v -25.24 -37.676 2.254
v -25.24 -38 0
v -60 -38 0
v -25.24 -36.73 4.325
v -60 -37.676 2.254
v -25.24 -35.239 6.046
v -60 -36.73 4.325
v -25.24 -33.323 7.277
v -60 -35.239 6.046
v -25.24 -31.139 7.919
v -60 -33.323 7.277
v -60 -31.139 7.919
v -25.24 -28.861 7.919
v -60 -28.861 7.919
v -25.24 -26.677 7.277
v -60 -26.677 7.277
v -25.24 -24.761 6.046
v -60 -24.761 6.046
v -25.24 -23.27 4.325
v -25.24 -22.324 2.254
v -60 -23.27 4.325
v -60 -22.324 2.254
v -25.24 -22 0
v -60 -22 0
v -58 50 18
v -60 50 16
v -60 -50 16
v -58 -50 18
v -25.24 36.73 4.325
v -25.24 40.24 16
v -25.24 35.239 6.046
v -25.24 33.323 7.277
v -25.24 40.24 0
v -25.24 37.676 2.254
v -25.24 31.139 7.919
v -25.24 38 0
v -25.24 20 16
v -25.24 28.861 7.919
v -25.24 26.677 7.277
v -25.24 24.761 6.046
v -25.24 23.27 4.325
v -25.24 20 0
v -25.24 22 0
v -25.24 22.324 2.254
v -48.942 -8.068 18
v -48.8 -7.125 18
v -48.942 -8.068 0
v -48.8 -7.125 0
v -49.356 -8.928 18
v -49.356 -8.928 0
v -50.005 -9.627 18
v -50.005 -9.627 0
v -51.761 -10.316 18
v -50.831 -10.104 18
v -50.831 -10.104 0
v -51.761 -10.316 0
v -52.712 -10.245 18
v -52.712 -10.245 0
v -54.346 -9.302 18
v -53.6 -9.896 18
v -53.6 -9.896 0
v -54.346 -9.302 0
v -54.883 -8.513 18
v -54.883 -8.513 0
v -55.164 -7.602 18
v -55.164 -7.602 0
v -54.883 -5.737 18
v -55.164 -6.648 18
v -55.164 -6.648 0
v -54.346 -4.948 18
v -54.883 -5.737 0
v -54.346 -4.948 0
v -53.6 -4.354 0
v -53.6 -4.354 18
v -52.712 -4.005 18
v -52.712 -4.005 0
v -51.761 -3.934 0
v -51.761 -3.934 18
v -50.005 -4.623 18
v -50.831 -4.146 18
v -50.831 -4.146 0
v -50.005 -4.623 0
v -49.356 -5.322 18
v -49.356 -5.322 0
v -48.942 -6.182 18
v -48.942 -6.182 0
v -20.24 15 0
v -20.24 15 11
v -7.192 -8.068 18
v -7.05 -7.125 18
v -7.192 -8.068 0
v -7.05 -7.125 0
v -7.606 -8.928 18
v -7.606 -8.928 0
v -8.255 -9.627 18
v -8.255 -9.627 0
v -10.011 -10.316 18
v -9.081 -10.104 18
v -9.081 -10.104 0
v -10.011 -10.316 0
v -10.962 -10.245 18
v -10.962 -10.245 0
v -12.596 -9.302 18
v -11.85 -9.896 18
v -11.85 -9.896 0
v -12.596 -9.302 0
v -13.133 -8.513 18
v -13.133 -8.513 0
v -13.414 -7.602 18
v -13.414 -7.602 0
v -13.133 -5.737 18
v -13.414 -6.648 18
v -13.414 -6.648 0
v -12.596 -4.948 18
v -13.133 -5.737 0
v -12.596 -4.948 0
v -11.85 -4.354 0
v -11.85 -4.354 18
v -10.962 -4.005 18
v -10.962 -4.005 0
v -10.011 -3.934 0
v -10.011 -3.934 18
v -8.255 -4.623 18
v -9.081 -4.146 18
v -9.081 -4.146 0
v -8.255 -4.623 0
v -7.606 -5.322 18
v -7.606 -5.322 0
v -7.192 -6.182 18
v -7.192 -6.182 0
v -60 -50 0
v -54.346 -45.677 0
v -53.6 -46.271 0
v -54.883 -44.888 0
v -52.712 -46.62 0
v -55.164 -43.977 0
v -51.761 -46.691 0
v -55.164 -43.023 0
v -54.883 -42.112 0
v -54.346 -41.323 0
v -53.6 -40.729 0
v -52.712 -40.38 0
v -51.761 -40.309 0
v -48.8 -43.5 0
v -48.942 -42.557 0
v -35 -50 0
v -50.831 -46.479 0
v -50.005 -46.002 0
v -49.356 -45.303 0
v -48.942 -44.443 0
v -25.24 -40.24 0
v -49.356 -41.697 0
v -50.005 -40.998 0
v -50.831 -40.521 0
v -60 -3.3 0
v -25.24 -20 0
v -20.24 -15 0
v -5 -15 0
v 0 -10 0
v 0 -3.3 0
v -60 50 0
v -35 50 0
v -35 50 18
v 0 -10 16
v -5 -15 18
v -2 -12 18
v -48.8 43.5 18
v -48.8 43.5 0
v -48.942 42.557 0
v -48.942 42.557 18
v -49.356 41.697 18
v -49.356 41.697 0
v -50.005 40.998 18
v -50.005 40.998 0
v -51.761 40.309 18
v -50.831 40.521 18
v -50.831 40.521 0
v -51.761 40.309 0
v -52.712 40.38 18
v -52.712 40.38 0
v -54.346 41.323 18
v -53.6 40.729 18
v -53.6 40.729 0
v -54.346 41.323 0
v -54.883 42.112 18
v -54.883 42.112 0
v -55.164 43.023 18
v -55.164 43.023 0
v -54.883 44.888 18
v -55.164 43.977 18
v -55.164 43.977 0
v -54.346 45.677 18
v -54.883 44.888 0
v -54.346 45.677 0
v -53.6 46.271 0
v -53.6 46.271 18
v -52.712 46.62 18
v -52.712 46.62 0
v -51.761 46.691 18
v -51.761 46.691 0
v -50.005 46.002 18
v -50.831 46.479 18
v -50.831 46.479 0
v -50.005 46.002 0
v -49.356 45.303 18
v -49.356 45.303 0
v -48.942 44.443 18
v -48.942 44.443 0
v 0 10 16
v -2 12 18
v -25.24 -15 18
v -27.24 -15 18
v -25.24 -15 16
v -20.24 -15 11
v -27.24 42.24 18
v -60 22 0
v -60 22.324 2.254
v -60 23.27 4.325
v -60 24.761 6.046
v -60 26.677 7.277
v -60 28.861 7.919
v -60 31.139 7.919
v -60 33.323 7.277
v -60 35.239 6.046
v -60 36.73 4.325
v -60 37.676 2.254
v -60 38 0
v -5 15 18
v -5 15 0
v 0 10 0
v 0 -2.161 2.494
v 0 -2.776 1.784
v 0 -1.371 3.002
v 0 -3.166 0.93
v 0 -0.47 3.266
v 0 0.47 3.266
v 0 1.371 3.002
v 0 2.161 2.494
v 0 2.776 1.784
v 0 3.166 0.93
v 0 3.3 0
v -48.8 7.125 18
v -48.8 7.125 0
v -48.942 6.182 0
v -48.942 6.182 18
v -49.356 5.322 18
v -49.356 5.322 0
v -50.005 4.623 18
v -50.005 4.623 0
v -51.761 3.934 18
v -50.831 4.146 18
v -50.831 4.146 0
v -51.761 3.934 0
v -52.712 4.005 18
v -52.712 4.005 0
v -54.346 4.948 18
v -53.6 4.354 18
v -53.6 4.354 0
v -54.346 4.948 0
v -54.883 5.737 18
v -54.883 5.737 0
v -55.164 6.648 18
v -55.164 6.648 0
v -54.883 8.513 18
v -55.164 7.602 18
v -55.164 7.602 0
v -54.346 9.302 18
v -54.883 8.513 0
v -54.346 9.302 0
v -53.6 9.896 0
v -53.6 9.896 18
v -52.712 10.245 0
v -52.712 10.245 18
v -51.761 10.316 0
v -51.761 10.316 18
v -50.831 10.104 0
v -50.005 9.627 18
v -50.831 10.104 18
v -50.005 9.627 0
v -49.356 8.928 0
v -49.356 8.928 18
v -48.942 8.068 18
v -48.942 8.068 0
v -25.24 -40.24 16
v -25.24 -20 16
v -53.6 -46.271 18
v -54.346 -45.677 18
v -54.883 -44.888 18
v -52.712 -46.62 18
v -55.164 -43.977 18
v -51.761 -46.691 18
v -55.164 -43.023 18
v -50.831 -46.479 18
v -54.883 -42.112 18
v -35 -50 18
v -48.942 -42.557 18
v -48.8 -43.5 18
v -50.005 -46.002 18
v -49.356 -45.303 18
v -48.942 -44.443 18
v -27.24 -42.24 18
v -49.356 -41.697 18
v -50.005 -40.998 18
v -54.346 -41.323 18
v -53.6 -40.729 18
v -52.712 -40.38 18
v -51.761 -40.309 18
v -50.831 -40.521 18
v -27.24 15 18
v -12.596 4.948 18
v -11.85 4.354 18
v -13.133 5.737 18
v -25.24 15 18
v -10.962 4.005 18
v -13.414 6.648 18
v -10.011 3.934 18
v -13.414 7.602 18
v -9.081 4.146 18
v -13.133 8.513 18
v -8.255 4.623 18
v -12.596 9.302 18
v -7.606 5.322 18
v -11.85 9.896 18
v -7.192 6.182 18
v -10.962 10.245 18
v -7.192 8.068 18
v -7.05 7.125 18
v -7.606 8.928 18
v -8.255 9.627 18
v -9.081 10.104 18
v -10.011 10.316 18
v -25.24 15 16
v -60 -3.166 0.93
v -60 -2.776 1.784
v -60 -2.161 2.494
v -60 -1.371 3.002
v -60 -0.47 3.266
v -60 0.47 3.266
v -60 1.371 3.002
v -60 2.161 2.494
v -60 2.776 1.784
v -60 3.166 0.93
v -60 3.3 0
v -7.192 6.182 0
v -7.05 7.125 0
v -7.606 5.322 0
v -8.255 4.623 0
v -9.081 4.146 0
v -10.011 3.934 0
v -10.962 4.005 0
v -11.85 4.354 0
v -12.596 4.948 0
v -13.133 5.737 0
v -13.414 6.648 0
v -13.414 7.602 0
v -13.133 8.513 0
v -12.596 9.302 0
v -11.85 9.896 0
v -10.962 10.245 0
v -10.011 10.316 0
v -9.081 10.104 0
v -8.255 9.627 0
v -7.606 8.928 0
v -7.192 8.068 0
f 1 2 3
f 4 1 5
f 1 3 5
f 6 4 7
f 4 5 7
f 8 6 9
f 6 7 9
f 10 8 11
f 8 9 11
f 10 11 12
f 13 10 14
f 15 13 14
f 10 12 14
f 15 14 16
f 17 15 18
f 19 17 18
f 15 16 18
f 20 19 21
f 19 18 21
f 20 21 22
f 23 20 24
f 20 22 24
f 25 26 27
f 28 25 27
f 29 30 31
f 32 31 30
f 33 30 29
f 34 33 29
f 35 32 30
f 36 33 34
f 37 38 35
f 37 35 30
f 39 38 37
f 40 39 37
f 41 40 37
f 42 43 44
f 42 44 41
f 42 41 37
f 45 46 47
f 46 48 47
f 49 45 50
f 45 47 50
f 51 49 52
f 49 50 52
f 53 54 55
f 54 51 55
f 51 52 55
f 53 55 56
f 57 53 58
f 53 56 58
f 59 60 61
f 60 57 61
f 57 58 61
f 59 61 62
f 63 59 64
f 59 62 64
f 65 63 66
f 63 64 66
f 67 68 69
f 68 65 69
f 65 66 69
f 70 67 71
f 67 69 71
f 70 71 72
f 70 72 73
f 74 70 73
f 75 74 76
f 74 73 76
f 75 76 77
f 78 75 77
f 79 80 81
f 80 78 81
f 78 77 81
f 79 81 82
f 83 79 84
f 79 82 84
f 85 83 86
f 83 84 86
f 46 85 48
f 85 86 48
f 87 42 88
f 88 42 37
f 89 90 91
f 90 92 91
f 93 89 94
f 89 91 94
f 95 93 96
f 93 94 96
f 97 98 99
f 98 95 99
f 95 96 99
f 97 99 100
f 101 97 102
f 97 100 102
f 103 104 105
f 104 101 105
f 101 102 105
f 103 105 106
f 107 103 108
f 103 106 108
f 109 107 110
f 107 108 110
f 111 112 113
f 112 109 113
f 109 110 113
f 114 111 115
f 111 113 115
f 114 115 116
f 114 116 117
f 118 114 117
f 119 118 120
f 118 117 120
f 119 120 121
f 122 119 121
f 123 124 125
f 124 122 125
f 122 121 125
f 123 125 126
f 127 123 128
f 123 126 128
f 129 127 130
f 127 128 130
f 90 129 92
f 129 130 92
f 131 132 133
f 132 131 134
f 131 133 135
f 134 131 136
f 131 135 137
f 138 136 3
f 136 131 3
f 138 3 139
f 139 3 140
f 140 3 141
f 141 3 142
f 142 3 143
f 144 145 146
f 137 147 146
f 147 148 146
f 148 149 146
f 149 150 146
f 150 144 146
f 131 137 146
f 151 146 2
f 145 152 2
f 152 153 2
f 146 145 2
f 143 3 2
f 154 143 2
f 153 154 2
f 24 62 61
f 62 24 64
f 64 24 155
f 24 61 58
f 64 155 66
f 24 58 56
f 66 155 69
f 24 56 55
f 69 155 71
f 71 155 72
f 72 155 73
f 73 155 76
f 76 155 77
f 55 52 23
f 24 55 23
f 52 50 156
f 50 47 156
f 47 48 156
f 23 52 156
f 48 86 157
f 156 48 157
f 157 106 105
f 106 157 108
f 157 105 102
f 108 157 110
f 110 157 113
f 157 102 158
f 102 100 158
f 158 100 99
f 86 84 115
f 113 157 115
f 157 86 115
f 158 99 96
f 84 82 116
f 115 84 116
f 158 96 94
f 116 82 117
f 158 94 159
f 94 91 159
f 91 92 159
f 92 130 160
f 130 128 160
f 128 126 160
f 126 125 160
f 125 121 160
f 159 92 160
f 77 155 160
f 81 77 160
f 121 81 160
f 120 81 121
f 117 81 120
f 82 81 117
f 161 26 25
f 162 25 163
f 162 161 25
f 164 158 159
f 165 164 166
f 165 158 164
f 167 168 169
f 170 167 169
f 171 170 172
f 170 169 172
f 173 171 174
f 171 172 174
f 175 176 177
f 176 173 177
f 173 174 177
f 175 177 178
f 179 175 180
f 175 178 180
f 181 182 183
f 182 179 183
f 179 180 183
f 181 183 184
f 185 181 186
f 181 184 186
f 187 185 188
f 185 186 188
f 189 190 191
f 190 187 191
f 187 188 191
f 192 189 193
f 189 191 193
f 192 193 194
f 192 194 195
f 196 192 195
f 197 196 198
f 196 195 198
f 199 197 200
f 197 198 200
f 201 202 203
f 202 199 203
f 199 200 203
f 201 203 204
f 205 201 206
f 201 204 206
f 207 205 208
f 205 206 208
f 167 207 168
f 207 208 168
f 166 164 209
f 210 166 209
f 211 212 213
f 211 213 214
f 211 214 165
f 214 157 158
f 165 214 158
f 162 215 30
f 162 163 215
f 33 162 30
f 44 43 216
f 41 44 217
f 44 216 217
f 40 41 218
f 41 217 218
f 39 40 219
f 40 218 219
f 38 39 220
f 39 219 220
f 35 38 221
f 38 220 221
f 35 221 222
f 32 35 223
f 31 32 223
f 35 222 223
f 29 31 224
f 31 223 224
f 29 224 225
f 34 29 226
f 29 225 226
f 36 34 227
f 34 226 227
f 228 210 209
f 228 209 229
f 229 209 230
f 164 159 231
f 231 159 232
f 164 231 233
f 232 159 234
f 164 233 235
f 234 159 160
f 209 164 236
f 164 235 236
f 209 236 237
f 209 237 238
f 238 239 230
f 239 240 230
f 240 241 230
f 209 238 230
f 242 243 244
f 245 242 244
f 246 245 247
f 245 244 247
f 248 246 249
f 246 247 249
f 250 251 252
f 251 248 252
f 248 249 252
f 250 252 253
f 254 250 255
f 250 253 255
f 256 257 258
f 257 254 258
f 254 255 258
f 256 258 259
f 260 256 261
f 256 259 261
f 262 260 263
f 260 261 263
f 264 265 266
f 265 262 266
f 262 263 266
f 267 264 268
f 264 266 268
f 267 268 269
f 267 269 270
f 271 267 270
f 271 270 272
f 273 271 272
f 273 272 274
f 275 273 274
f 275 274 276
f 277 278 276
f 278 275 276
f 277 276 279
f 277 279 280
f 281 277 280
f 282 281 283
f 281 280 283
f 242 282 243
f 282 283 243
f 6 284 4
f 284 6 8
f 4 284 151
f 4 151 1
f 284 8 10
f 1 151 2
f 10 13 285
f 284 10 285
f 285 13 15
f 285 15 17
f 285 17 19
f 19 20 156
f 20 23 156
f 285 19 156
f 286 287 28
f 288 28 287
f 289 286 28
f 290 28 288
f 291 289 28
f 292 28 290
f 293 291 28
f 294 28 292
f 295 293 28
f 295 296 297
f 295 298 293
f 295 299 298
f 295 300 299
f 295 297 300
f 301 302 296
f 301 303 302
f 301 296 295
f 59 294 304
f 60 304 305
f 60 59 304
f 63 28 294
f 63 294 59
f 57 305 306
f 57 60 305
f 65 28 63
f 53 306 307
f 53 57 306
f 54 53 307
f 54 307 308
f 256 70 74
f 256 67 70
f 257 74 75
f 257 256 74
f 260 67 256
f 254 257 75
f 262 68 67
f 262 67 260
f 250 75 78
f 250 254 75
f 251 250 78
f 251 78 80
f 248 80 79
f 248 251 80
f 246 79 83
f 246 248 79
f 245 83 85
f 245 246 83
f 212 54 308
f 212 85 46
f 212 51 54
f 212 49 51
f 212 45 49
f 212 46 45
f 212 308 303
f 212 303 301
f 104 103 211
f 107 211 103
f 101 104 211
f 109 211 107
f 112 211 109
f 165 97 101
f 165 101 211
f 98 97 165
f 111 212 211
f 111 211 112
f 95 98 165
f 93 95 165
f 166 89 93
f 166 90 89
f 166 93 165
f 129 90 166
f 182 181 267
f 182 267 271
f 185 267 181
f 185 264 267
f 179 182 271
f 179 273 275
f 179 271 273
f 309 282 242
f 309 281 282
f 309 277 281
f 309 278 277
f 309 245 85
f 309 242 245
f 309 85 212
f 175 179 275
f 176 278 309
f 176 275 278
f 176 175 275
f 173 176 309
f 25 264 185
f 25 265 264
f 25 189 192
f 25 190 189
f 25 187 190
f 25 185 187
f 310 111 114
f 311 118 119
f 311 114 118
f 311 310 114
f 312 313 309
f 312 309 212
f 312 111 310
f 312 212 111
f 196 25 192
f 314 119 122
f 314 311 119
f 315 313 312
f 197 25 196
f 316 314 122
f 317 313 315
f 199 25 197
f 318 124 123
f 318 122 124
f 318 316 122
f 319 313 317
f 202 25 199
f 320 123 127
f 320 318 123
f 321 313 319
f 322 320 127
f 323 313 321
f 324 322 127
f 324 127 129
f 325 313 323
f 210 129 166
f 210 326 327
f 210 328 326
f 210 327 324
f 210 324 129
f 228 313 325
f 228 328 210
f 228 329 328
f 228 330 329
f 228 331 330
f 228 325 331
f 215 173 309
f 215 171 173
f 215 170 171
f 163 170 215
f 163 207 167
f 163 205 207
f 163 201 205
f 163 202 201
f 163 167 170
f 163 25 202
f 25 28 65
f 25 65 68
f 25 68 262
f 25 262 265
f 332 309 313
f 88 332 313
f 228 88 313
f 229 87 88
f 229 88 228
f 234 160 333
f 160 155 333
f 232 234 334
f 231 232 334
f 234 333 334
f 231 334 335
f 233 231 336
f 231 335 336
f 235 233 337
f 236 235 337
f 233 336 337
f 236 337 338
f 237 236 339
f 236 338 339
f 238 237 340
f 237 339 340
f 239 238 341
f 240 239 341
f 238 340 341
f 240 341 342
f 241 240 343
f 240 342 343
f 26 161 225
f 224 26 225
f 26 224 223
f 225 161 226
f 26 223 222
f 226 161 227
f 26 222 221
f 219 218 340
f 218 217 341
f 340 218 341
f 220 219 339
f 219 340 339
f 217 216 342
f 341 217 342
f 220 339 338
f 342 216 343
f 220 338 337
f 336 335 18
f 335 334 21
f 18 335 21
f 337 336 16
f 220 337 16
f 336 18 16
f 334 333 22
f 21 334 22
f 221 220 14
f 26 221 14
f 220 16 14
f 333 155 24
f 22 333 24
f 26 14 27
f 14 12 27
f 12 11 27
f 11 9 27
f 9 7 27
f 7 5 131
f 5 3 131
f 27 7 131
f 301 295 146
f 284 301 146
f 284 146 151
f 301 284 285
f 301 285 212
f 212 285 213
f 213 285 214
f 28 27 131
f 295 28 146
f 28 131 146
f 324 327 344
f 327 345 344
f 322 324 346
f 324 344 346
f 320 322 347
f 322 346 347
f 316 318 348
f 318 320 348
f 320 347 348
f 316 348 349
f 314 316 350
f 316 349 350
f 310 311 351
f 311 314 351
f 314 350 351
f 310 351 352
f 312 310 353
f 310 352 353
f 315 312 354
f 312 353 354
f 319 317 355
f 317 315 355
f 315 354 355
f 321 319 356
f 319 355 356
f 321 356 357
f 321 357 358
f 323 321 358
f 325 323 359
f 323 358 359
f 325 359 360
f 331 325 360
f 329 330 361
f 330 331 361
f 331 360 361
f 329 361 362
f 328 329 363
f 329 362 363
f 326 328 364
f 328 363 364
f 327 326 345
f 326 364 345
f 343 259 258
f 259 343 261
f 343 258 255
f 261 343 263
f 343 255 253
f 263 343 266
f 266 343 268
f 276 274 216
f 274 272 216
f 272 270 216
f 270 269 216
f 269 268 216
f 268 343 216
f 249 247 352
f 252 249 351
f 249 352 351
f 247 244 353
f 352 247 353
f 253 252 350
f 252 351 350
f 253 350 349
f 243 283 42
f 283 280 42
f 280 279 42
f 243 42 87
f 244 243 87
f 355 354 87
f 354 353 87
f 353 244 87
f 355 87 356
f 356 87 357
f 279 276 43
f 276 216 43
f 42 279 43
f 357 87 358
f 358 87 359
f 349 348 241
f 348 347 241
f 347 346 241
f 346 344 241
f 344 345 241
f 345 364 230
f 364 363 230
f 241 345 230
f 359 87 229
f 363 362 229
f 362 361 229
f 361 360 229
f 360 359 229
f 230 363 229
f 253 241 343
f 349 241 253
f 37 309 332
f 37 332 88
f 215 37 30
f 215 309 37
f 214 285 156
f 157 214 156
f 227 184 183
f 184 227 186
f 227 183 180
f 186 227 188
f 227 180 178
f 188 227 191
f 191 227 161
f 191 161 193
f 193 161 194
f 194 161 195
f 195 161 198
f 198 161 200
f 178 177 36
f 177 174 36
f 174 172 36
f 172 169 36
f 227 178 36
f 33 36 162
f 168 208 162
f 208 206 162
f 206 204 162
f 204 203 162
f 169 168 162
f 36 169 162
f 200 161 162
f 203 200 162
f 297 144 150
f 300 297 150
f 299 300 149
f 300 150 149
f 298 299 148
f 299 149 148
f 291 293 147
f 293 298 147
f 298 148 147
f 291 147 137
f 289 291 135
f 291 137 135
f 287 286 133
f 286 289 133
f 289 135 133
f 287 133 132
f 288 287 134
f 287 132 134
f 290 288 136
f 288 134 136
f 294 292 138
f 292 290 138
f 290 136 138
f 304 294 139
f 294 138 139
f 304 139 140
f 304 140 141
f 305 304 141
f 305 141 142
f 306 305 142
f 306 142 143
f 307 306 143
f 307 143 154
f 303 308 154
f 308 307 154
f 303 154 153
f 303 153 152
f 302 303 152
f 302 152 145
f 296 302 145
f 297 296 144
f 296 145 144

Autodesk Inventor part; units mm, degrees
ref_plane "YZ Plane" through (0, 0, 0) normal (1, 0, 0) x (0, 1, 0)
ref_plane "XZ Plane" through (0, 0, 0) normal (0, 1, 0) x (-1, 0, 0)
ref_plane "XY Plane" through (0, 0, 0) normal (0, 0, 1) x (1, 0, 0)
sketch "Sketch1" plane through (0, 0, 0) normal (0, 0, 1) x (1, 0, 0)
  line L0 (-58, -50) -> (-58, 50) construction
  line L1 (-58, -50) -> (58, -50) construction
  line L2 (58, 50) -> (58, -50) construction
  line L3 (58, 50) -> (-58, 50) construction
  line L4 (-48.8, -35) -> (-48.8, -43.5) construction
  arc A0 (-55.2, -43.5) -> (-48.8, -43.5) centre (-52, -43.5) ccw construction
  line L5 (-55.2, -43.5) -> (-55.2, -35) construction
  arc A1 (-48.8, -35) -> (-55.2, -35) centre (-52, -35) ccw construction
  line L6 (55.2, -35) -> (55.2, -43.5) construction
  arc A2 (48.8, -43.5) -> (55.2, -43.5) centre (52, -43.5) ccw construction
  line L7 (48.8, -43.5) -> (48.8, -35) construction
  arc A3 (55.2, -35) -> (48.8, -35) centre (52, -35) ccw construction
  circle A4 centre (10.25, -35) radius 3.2 construction
  circle A5 centre (-10.25, -35) radius 3.2 construction
  circle A6 centre (-10.25, 35) radius 3.2 construction
  circle A7 centre (10.25, 35) radius 3.2 construction
  line L8 (-55.2, 35) -> (-55.2, 43.5) construction
  arc A8 (-48.8, 43.5) -> (-55.2, 43.5) centre (-52, 43.5) ccw construction
  line L9 (-48.8, 43.5) -> (-48.8, 35) construction
  arc A9 (-55.2, 35) -> (-48.8, 35) centre (-52, 35) ccw construction
  circle A10 centre (-52, 7.125) radius 3.2 construction
  line L10 (-7.05, -7.125) -> (-7.05, -15.625) construction
  arc A11 (-13.45, -15.625) -> (-7.05, -15.625) centre (-10.25, -15.625) ccw construction
  line L11 (-13.45, -15.625) -> (-13.45, -7.125) construction
  arc A12 (-7.05, -7.125) -> (-13.45, -7.125) centre (-10.25, -7.125) ccw construction
  circle A13 centre (52, -7.125) radius 3.2 construction
  circle A14 centre (-52, -7.125) radius 3.2 construction
  line L12 (13.45, -7.125) -> (13.45, -15.625) construction
  arc A15 (7.05, -15.625) -> (13.45, -15.625) centre (10.25, -15.625) ccw construction
  line L13 (7.05, -15.625) -> (7.05, -7.125) construction
  arc A16 (13.45, -7.125) -> (7.05, -7.125) centre (10.25, -7.125) ccw construction
  circle A17 centre (52, 7.125) radius 3.2 construction
  line L14 (13.45, 15.625) -> (13.45, 7.125) construction
  arc A18 (7.05, 7.125) -> (13.45, 7.125) centre (10.25, 7.125) ccw construction
  line L15 (7.05, 7.125) -> (7.05, 15.625) construction
  arc A19 (13.45, 15.625) -> (7.05, 15.625) centre (10.25, 15.625) ccw construction
  line L16 (55.2, 43.5) -> (55.2, 35) construction
  arc A20 (48.8, 35) -> (55.2, 35) centre (52, 35) ccw construction
  line L17 (48.8, 35) -> (48.8, 43.5) construction
  arc A21 (55.2, 43.5) -> (48.8, 43.5) centre (52, 43.5) ccw construction
  line L18 (-7.05, 15.625) -> (-7.05, 7.125) construction
  arc A22 (-13.45, 7.125) -> (-7.05, 7.125) centre (-10.25, 7.125) ccw construction
  line L19 (-13.45, 7.125) -> (-13.45, 15.625) construction
  arc A23 (-7.05, 15.625) -> (-13.45, 15.625) centre (-10.25, 15.625) ccw construction
  line L20 (60, 50) -> (58, 50) construction
  line L21 (58, 50) -> (58, -50) construction
  line L22 (58, -50) -> (60, -50) construction
  line L23 (60, -50) -> (60, 50) construction
  line L24 (-60, -50) -> (-58, -50) construction
  line L25 (-58, -50) -> (-58, 50) construction
  line L26 (-58, 50) -> (-60, 50) construction
  line L27 (-60, 50) -> (-60, -50) construction
  circle A24 centre (-52, 43.5) radius 3.2
  circle A25 centre (-10.25, 15.625) radius 3.2
  circle A26 centre (52, 43.5) radius 3.2
  circle A27 centre (-52, -43.5) radius 3.2
  circle A28 centre (-52, 7.125) radius 3.2
  circle A29 centre (-52, -7.125) radius 3.2
  circle A30 centre (-10.25, -15.625) radius 3.2
  circle A31 centre (-10.25, -35) radius 3.2
  circle A32 centre (-10.25, 35) radius 3.2
  line L28 (-60, 50) -> (-60, -50)
  line L29 (-60, -50) -> (-35, -50)
  line L30 (0, -15) -> (0, 15)
  line L31 (-60, 50) -> (-35, 50)
  circle A33 centre (-10.25, 7.125) radius 3.2
  circle A34 centre (-10.25, -7.125) radius 3.2
  line L32 (-35, 50) -> (-25.2404, 40.2404)
  line L33 (-25.2404, 40.2404) -> (-25.2404, 15)
  line L34 (-35, -50) -> (-25.2404, -40.2404)
  line L35 (-25.2404, -40.2404) -> (-25.2404, -15)
  line L36 (-25.2404, -15) -> (0, -15)
  line L37 (-25.2404, 15) -> (0, 15)
  point P0 (0, 0)
  point P1 (0, 0)
  dimension "d13" = 35
  dimension "d19" = 135
  dimension "d20" = 135
  dimension "d21" = 30
extrude "Extrusion1" add sketch "Sketch1" along normal blind 18 contours L37 A25 | A25 L37 L30 L36 A30 L35 L34 L29 L28 L31 L32 L33 | L36 A30 picked at (-10.8738, 14.3431) picked at (-10.6405, -14.2157)
sketch "Sketch4" plane through (-60, -50, 0) normal (-1, 0, 0) x (0, 0, 1)
  line L0 (16, 100) -> (16, 0) projected
  line L1 (16, 100) -> (0, 100) projected
  line L2 (0, 88) -> (0, 100) projected
  arc A0 (0, 72) -> (0, 88) centre (0, 80) ccw projected
  line L3 (0, 62.5) -> (0, 72) projected
  arc A1 (0, 37.5) -> (0, 62.5) centre (0, 50) ccw projected
  line L4 (0, 28) -> (0, 37.5) projected
  arc A2 (0, 12) -> (0, 28) centre (0, 20) ccw projected
  line L5 (0, 0) -> (0, 12) projected
  line L6 (16, 0) -> (0, 0) projected
  line L7 (-16, 0) -> (-16, 100) projected
  line L8 (-16, 0) -> (0, 0) projected
  line L9 (0, 12) -> (0, 0) projected
  arc A3 (0, 28) -> (0, 12) centre (0, 20) ccw projected
  line L10 (0, 37.5) -> (0, 28) projected
  arc A4 (0, 62.5) -> (0, 37.5) centre (0, 50) ccw projected
  line L11 (0, 72) -> (0, 62.5) projected
  arc A5 (0, 88) -> (0, 72) centre (0, 80) ccw projected
  line L12 (0, 100) -> (0, 88) projected
  line L13 (-16, 100) -> (0, 100) projected
  circle A6 centre (0, 50) radius 3.3 projected
  point P0 (0, 50)
extrude "Extrusion4" cut sketch "Sketch4" against normal through all contours A0 A5 | A3 A2 | A6
chamfer "Chamfer3" distance 2 angle 45 4 edges at (-60, 0, 18) (0, 0, 18) (-25.2404, -27.6202, 18) (-25.2404, 27.6202, 18)
chamfer "Chamfer4" distance 5 angle 45 4 edges at (-25.2404, 15, 8) (-25.2404, -15, 8) (0, -15, 8) (0, 15, 8)
properties part number "AX_XY" material "PC/ABS Plastic"
